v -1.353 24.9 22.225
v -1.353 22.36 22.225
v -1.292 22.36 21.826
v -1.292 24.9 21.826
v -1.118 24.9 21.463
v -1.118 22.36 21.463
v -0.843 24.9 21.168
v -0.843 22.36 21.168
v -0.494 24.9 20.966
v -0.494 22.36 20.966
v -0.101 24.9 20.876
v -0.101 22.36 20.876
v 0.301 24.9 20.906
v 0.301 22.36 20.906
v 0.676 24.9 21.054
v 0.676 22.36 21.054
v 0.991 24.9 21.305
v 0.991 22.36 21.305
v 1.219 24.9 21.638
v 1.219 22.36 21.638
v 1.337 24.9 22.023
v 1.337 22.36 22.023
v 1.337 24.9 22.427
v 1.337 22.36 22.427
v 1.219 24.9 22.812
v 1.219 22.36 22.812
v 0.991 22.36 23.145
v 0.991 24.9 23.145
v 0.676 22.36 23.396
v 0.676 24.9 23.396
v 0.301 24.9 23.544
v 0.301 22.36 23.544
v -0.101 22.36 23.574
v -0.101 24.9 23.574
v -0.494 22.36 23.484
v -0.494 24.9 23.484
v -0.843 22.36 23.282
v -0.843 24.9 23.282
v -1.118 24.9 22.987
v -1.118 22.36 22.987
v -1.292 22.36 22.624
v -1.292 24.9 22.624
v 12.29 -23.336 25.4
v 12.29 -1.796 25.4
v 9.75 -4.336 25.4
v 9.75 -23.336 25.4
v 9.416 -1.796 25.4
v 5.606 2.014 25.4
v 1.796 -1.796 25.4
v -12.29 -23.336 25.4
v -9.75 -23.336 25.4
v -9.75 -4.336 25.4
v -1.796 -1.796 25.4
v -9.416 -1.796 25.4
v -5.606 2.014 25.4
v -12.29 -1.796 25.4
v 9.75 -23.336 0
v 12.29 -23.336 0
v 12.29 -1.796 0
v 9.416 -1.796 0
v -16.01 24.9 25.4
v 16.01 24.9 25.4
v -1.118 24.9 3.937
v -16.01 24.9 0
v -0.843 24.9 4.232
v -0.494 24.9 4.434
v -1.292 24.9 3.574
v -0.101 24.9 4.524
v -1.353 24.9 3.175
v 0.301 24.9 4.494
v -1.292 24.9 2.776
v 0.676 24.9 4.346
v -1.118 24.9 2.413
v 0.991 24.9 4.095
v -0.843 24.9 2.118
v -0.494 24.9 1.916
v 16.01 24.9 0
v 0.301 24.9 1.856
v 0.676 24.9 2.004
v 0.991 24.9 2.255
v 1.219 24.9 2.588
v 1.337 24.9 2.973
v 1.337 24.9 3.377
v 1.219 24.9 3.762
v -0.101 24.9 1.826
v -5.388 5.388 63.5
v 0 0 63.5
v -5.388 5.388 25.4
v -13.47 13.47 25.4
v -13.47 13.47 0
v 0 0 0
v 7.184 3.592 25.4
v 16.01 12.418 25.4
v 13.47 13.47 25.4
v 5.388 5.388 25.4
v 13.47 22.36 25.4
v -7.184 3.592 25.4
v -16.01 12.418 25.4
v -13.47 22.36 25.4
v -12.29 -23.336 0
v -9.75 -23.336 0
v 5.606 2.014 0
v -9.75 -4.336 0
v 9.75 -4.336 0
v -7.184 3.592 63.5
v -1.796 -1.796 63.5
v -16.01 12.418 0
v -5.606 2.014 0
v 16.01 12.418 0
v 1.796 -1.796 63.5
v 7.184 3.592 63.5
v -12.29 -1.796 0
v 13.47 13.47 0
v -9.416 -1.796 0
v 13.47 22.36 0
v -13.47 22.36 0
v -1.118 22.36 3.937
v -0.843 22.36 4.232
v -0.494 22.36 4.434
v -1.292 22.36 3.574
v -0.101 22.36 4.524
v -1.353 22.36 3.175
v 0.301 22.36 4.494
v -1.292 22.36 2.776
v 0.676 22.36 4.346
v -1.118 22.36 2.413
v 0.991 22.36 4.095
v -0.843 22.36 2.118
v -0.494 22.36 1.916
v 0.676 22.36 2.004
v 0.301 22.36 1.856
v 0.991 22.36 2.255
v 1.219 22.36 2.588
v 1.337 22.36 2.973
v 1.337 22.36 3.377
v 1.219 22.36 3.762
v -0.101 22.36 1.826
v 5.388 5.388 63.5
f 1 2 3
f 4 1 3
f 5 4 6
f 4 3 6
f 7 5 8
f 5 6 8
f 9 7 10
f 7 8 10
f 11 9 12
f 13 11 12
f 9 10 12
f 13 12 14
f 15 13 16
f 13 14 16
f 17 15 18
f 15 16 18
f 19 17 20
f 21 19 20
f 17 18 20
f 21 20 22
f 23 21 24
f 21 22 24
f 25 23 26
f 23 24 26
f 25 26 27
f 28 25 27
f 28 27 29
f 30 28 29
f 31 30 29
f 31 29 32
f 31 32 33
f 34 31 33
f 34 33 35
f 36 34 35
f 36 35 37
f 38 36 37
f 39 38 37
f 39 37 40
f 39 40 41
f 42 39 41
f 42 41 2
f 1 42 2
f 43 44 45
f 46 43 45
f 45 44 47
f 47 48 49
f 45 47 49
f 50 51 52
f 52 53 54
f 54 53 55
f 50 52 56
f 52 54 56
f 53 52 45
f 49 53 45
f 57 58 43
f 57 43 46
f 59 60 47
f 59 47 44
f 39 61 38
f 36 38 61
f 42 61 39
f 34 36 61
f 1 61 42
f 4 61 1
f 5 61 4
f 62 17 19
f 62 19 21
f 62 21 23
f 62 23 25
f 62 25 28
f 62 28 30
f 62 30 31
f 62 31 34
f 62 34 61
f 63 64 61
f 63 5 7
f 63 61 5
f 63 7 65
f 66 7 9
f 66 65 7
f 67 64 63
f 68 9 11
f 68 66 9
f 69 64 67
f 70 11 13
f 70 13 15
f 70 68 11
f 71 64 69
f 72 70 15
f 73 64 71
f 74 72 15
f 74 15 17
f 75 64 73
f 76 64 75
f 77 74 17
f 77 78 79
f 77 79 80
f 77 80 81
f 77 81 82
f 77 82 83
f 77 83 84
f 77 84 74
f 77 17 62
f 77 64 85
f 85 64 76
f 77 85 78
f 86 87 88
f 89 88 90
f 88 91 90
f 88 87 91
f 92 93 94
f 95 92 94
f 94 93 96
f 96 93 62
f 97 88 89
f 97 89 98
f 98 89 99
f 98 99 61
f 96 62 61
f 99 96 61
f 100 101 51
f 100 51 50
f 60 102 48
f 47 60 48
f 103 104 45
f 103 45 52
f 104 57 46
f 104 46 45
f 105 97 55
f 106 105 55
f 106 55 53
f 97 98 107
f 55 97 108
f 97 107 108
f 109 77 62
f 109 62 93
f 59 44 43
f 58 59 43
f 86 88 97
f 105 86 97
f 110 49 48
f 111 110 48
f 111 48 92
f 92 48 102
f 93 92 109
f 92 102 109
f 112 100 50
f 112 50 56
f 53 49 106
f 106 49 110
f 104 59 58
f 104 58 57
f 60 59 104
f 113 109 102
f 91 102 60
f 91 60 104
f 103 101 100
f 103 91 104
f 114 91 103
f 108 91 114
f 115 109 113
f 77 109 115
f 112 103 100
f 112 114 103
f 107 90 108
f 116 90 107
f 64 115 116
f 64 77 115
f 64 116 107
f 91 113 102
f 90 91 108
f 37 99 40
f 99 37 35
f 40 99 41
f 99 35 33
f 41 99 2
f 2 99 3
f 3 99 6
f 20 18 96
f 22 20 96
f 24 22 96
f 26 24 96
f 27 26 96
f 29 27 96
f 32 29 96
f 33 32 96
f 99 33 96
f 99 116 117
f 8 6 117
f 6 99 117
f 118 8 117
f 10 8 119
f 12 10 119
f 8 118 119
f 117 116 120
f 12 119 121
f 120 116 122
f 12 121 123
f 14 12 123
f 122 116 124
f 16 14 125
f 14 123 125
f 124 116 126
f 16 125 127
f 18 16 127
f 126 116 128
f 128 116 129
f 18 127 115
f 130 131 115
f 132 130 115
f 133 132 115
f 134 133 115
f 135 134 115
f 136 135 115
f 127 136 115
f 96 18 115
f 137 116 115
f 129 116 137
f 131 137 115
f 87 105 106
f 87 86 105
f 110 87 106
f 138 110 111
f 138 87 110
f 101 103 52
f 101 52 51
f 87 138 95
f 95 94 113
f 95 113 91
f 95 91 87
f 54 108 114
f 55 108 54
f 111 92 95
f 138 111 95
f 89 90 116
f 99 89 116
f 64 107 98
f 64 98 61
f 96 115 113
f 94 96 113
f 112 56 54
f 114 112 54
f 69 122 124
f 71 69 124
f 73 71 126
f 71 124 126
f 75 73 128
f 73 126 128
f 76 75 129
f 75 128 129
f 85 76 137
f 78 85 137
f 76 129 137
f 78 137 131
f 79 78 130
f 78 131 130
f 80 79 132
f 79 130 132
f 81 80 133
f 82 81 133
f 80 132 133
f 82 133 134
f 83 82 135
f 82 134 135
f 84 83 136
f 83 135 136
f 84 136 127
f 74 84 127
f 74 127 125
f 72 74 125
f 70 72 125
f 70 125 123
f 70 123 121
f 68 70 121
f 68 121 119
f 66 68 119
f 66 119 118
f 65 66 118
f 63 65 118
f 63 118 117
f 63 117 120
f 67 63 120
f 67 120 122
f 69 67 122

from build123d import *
from OCP.BRepFilletAPI import BRepFilletAPI_MakeChamfer

# Parameters (mm, degrees)
BOSS_EXTRUDE1_DEPTH       = 25.4
BOSS_EXTRUDE2_DEPTH       = 38.1
F_6_32_TAPPED_HOLE1_D     = 2.7051
F_6_32_TAPPED_HOLE1_DEPTH = 12.7
F_6_32_TAPPED_HOLE1_TIP   = 0.8126940302657266
CHAMFER1_SIZE             = 2.54
BOSS_EXTRUDE3_DEPTH       = 25.4
CHAMFER2_SIZE             = 7.619999999999999
CHAMFER2_SIZE2            = 5.388153672641502


with BuildPart() as part:
    # Sketch1 → Boss-Extrude1 (new body)
    with BuildSketch(Plane.XY):
        Polygon((0, -3.592102448427662), (-16.01038418160373, 12.418281733176066), (-16.010384181603733, 24.90038418160373), (16.01038418160373, 24.90038418160373), (16.010384181603733, 12.418281733176075), align=None)
        Polygon((0, 0), (-13.47038418160373, 13.47038418160373), (-13.470384181603732, 22.360384181603727), (13.470384181603732, 22.360384181603727), (13.47038418160373, 13.47038418160373), align=None, mode=Mode.SUBTRACT)
    extrude(amount=BOSS_EXTRUDE1_DEPTH)

    # Sketch2 → Boss-Extrude2 (add)
    with BuildSketch(Plane.XY.offset(25.4)):
        Polygon((0, 0), (-5.388153672641493, 5.388153672641493), (-7.184204896855324, 3.592102448427661), (0, -3.592102448427662), (7.184204896855322, 3.5921024484276627), (5.388153672641491, 5.3881536726414945), align=None)
    extrude(amount=BOSS_EXTRUDE2_DEPTH)

    # #6-32 Tapped Hole1
    with Locations(Plane(origin=(0, 24.90038418160373, 0), x_dir=(1, 0, 0), z_dir=(0, 1, 0))):
        with Locations((0, -3.175), (0, -22.225)):
            Hole(F_6_32_TAPPED_HOLE1_D / 2, depth=F_6_32_TAPPED_HOLE1_DEPTH)
            with Locations((0, 0, -(F_6_32_TAPPED_HOLE1_DEPTH + F_6_32_TAPPED_HOLE1_TIP / 2))):  # 118° drill point
                Cone(0, F_6_32_TAPPED_HOLE1_D / 2, F_6_32_TAPPED_HOLE1_TIP, mode=Mode.SUBTRACT)

    # Chamfer1
    chamfer1_edges = [part.edges().sort_by_distance(p)[0] for p in [
        (0, -3.592102448427662, 31.75),
    ]]
    chamfer(chamfer1_edges, length=CHAMFER1_SIZE)

    # Sketch5 → Boss-Extrude3 (add)
    with BuildSketch(Plane(origin=(0, 0, 0), x_dir=(-1, 0, 0), z_dir=(0, 0, -1))):
        Polygon((1.7960512242138398, -1.7960512242138225), (-1.7960512242138331, -1.7960512242138298), (-12.29, -1.796051224213831), (-12.289999999999996, -23.336051224213833), (-9.749999999999998, -23.336051224213833), (-9.749999999999998, -4.336051224213831), (9.749999999999998, -4.336051224213828), (9.750000000000005, -23.33605122421383), (12.290000000000003, -23.33605122421383), (12.29, -1.796051224213828), align=None)
    extrude(amount=-BOSS_EXTRUDE3_DEPTH)

    # Chamfer2: one chamfer whose edges measure the first distance from different faces: ONE call of the kernel's chamfer builder (chamfer() names one face for all edges)
    chamfer2_edges_1 = [part.edges().sort_by_distance(p)[0] for p in [
        (1.7960512242138322, -1.7960512242138291, 12.7),
    ]]
    chamfer2_side_1 = [part.faces().sort_by_distance(p)[0] for p in [
        (7.0430256121069155, -1.7960512242138404, 12.7),
    ]]
    chamfer2_edges_2 = [part.edges().sort_by_distance(p)[0] for p in [
        (-1.7960512242138293, -1.7960512242138293, 12.7),
    ]]
    chamfer2_side_2 = [part.faces().sort_by_distance(p)[0] for p in [
        (-7.043025612106914, -1.7960512242138118, 12.7),
    ]]
    chamfer2 = BRepFilletAPI_MakeChamfer(part.part.solid().wrapped)
    for e in chamfer2_edges_1:
        chamfer2.Add(CHAMFER2_SIZE, CHAMFER2_SIZE2, e.wrapped, chamfer2_side_1[0].wrapped)  # the first distance lies on this face
    for e in chamfer2_edges_2:
        chamfer2.Add(CHAMFER2_SIZE, CHAMFER2_SIZE2, e.wrapped, chamfer2_side_2[0].wrapped)  # the first distance lies on this face
    add(Compound.cast(chamfer2.Shape()), mode=Mode.REPLACE)


solid = part.part
